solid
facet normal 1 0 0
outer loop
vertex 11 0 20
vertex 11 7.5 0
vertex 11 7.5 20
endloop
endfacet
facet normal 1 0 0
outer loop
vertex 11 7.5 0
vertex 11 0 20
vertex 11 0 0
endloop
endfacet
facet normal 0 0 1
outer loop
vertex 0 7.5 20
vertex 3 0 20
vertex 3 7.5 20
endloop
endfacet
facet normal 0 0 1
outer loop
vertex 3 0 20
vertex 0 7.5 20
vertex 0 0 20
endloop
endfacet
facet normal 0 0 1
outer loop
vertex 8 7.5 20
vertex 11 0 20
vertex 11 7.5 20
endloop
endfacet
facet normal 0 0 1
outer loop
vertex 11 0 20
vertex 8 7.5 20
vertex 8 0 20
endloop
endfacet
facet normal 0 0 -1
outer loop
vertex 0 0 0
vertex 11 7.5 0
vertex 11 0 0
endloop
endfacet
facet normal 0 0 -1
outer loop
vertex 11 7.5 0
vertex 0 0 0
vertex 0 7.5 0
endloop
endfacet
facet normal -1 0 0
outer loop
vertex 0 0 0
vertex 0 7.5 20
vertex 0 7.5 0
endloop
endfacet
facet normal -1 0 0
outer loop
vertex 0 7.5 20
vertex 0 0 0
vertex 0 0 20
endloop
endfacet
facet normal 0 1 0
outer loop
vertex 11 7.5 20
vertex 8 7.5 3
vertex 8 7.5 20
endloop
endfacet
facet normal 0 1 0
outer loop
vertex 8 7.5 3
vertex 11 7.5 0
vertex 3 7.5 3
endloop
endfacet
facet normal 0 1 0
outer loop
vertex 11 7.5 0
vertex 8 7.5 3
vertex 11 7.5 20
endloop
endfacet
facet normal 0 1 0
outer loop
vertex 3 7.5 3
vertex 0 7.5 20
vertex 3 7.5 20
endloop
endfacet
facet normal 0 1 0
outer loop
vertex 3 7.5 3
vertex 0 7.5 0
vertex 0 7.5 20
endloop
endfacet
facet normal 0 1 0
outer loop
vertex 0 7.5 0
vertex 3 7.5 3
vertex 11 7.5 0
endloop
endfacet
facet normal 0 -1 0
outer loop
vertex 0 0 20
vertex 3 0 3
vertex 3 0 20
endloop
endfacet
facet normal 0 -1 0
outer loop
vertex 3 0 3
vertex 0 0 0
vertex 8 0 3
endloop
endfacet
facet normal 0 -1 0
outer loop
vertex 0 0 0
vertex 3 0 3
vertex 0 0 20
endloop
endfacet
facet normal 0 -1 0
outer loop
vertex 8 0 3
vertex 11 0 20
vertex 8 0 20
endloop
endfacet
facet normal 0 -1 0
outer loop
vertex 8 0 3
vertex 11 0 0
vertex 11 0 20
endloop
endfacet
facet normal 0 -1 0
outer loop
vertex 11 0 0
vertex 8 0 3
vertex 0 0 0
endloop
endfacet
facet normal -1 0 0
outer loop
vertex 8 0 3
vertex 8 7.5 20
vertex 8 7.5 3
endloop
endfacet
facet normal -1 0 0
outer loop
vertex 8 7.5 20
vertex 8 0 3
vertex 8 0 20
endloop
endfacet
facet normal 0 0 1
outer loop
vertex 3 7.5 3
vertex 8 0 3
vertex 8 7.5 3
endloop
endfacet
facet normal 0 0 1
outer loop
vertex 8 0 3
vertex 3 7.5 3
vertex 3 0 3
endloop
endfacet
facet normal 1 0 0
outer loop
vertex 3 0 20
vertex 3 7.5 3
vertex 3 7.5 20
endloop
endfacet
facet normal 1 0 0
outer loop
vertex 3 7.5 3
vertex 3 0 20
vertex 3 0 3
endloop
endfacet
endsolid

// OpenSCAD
// How many mm thick the clip is
ClipThick = 3;
//How many mm of gap
ClipGap = 5;
//How many mm tall the clip is
ClipHeight = 20;
//How many mm long the clip is
ClipLength = 7.5;




module Clip (Thickness, Gap, Height, Length)
{
	difference()
	{
	cube([Gap+2*Thickness, Length, Height]);
	translate([Thickness, 0-0.5, Thickness]) cube([Gap, Length+1, Height-Thickness+1]);
	}
}

Clip (ClipThick, ClipGap, ClipHeight, ClipLength);
